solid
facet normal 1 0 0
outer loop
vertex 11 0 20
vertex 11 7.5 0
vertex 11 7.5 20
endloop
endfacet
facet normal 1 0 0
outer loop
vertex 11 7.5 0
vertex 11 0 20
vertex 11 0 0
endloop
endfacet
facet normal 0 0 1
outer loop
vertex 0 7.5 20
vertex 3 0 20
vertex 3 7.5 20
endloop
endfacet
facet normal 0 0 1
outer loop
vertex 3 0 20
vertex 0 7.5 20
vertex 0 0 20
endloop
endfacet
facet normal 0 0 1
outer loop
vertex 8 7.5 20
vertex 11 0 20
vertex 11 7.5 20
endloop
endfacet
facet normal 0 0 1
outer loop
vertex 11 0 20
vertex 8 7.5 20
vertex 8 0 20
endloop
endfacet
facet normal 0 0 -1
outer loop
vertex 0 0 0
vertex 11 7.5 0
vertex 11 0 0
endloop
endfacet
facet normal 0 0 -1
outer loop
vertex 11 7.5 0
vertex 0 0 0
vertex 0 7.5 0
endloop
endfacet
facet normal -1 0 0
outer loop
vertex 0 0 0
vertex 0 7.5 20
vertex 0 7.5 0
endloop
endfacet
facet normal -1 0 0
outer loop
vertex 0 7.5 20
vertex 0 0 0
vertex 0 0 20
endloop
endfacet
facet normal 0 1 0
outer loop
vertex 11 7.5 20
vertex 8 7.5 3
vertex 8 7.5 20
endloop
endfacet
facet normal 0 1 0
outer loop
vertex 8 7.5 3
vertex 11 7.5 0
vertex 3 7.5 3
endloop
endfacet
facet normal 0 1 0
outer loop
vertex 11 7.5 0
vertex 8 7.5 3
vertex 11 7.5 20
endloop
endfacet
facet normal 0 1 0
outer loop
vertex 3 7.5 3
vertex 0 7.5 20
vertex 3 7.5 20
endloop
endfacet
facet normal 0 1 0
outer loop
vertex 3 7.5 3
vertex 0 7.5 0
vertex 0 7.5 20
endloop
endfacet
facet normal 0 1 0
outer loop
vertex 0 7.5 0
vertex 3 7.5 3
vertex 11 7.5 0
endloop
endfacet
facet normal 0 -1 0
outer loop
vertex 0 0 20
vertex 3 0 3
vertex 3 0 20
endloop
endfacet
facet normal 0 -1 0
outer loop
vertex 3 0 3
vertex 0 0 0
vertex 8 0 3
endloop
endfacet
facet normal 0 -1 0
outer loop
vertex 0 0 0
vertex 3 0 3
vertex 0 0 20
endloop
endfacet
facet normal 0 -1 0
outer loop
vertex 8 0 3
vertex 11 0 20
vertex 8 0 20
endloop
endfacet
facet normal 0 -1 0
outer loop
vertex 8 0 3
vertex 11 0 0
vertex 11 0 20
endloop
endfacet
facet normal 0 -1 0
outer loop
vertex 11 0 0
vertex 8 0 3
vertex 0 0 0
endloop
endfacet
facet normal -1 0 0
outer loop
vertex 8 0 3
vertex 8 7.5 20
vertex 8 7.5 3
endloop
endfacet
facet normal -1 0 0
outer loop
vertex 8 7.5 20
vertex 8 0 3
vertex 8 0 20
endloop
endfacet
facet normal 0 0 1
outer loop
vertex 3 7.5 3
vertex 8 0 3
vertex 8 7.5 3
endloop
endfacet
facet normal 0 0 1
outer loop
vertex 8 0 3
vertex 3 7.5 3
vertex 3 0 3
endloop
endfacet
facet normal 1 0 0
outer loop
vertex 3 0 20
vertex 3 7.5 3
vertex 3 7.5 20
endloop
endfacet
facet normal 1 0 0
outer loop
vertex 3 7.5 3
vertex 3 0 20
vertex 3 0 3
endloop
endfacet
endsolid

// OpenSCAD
// How many mm thick the clip is
ClipThick = 3;
//How many mm of gap
ClipGap = 5;
//How many mm tall the clip is
ClipHeight = 20;
//How many mm long the clip is
ClipLength = 7.5;




module Clip (Thickness, Gap, Height, Length)
{
	difference()
	{
	cube([Gap+2*Thickness, Length, Height]);
	translate([Thickness, 0-0.5, Thickness]) cube([Gap, Length+1, Height-Thickness+1]);
	}
}

Clip (ClipThick, ClipGap, ClipHeight, ClipLength);
